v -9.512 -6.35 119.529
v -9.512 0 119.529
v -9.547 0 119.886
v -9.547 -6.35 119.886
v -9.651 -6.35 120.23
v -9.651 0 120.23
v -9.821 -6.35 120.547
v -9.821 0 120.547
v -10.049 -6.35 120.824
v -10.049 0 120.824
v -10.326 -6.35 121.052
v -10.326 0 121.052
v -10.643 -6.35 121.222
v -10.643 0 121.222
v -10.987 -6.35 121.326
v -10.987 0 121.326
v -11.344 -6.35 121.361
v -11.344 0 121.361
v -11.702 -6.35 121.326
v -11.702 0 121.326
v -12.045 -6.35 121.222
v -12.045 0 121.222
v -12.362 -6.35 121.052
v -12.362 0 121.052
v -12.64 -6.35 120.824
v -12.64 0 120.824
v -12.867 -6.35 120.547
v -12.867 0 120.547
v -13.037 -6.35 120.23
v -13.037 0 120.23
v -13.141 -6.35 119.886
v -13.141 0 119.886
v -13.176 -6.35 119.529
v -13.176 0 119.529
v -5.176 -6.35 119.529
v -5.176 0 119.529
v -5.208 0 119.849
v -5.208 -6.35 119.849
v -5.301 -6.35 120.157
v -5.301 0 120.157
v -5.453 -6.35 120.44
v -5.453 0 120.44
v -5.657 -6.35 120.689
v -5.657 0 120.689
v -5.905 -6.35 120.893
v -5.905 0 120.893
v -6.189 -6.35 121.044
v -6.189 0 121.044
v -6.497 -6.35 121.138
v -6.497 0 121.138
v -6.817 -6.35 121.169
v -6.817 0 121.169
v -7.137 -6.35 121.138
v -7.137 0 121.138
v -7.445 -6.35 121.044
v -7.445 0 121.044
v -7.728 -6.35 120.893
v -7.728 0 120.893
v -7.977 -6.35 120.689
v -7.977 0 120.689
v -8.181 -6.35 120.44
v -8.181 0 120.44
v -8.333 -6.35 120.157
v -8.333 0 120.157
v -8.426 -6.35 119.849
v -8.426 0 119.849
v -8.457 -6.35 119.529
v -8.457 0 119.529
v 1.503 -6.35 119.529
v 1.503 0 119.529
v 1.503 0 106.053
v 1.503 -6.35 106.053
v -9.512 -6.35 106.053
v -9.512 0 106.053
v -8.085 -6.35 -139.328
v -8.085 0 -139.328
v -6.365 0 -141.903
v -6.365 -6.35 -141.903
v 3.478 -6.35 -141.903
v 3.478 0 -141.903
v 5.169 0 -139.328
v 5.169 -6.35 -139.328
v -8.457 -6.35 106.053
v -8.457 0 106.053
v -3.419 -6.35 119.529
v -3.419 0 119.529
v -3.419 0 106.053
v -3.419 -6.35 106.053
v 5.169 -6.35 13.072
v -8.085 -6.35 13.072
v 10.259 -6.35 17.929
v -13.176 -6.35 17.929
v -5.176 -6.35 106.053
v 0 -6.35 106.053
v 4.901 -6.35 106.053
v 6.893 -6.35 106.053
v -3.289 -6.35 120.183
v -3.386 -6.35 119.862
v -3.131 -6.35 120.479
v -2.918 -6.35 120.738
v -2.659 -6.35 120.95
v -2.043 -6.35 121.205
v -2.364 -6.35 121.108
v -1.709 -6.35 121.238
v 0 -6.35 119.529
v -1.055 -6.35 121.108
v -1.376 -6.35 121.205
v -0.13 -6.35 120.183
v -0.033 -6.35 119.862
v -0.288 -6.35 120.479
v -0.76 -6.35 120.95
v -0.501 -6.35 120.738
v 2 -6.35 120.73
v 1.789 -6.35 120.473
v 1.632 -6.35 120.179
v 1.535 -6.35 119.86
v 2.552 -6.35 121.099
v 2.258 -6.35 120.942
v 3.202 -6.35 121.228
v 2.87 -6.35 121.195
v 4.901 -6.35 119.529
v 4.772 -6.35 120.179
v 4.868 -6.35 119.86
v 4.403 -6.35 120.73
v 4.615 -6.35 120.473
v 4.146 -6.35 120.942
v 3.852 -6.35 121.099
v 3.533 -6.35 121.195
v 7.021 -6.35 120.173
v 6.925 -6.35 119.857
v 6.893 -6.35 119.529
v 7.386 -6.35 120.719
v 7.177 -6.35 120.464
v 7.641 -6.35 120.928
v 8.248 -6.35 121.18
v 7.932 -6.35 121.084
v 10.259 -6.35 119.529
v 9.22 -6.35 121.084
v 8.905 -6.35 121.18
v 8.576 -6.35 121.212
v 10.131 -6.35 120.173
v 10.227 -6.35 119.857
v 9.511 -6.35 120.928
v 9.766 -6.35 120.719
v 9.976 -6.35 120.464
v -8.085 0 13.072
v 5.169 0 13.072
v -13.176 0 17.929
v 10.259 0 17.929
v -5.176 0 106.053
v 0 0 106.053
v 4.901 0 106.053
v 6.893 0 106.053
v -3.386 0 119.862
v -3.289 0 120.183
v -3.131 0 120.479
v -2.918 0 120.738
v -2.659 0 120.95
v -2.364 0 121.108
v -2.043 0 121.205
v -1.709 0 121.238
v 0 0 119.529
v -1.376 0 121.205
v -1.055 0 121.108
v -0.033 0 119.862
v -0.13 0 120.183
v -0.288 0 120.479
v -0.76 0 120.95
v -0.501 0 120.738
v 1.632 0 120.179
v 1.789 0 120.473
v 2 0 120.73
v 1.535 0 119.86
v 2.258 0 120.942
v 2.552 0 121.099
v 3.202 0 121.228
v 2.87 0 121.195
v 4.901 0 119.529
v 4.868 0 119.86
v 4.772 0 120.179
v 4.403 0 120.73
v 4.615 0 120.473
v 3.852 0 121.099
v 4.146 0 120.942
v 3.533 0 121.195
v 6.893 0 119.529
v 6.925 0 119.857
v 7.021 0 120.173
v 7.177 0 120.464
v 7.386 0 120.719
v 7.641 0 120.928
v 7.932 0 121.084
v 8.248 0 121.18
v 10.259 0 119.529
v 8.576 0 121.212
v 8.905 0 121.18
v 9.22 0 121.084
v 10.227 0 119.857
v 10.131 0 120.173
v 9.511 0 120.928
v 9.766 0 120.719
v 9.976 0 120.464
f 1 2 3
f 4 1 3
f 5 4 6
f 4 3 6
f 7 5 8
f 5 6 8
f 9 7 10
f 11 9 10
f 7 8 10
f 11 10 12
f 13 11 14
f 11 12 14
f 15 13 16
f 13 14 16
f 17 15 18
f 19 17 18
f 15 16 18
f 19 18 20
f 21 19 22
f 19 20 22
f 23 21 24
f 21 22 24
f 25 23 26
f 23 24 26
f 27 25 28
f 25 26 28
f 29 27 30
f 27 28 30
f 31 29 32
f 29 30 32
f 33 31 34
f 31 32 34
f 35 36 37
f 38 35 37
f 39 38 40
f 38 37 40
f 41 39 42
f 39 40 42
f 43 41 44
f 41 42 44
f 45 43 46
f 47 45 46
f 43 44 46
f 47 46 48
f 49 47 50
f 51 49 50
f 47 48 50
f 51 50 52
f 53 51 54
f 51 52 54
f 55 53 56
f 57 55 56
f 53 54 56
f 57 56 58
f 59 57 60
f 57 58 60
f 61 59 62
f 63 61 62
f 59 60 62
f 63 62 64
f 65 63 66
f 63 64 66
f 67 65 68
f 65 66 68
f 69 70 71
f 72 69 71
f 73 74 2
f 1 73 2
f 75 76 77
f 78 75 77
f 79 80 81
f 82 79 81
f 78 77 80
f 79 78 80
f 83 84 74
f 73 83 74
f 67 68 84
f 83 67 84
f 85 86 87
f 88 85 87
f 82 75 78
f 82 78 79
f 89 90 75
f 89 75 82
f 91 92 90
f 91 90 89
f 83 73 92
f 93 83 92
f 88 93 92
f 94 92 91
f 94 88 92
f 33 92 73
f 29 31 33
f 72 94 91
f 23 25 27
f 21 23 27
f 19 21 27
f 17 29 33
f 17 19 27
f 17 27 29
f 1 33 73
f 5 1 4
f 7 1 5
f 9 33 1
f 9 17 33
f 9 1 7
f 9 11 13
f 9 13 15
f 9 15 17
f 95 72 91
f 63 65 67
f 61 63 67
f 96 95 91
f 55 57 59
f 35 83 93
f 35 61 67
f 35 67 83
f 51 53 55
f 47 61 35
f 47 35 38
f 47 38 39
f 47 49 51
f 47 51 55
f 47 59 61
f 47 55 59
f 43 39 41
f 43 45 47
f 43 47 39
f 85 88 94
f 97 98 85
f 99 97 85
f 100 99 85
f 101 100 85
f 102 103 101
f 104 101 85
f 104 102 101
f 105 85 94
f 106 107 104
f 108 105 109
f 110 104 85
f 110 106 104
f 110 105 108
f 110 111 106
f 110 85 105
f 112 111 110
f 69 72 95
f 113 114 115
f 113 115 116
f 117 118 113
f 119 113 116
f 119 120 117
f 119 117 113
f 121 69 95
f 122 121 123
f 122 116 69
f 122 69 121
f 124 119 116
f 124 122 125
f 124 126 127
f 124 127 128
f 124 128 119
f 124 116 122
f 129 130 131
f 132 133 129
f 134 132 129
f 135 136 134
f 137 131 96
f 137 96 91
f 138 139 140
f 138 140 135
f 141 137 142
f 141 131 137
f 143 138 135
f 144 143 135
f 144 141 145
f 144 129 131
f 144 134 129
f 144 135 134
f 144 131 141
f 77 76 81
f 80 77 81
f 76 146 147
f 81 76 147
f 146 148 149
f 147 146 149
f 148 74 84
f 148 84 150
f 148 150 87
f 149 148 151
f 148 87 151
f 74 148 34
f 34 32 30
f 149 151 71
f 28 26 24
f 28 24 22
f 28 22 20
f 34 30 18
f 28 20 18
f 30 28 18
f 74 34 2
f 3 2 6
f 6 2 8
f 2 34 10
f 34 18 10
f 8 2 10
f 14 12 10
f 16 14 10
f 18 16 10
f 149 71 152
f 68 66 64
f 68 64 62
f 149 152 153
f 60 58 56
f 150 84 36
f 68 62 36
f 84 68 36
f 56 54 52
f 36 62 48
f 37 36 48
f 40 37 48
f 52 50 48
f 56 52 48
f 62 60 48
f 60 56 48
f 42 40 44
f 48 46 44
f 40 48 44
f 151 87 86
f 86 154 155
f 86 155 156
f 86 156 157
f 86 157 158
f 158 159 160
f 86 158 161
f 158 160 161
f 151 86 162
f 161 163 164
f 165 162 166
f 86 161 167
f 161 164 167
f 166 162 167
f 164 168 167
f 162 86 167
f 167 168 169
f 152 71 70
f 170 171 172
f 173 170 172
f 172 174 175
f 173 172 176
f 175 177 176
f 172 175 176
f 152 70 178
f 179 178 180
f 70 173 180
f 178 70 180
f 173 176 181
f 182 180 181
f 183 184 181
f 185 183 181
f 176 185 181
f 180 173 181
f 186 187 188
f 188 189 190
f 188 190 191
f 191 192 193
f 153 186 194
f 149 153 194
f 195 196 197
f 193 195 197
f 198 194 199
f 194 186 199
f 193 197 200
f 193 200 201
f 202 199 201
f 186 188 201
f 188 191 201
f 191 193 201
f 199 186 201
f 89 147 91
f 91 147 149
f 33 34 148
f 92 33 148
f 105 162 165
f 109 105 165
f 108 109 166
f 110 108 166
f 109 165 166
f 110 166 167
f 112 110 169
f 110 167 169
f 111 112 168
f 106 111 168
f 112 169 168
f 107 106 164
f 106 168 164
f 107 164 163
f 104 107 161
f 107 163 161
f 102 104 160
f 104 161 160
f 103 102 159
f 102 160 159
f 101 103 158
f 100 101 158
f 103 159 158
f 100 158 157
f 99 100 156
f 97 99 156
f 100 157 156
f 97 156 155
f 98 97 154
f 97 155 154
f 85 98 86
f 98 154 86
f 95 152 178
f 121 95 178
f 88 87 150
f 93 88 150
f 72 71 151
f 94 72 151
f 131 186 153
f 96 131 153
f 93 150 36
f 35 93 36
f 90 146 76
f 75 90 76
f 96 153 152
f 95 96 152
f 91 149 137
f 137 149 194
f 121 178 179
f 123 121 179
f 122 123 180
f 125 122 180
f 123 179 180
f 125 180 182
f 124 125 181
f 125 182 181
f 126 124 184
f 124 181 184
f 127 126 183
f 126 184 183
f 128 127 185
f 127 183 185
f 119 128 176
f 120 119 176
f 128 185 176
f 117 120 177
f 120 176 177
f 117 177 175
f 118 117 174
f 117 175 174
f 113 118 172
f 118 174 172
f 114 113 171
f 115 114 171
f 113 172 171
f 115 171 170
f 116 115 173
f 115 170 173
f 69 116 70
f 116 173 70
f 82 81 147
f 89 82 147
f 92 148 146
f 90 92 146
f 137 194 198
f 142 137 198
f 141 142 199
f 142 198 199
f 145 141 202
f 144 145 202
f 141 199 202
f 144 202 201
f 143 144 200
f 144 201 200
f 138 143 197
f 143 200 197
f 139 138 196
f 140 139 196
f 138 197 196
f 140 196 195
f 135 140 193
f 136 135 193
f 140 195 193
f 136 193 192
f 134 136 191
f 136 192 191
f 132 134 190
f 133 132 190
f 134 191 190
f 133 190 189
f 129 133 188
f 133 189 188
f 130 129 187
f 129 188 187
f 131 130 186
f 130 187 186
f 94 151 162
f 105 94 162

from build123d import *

# Parameters (mm, degrees)
F1_DEPTH = 6.35


with BuildPart() as f1:
    # F0 (on Front) → F1 (new body)
    with BuildSketch(Plane.XZ):
        with BuildLine():
            Line((-8.085411, 13.072304), (-8.085411, -139.327696))
            Line((-8.085411, -139.327696), (-6.365239, -141.902923))
            Line((-6.365239, -141.902923), (3.477706, -141.902923))
            Line((3.477706, -141.902923), (5.168511, -139.327696))
            Line((5.168511, -139.327696), (5.168511, 13.072304))
            Line((5.168511, 13.072304), (10.259341, 17.928839))
            Line((10.259341, 17.928839), (10.259341, 119.528839))
            ThreePointArc((10.259341, 119.528839), (8.576134, 121.212046), (6.892927, 119.528839))
            Line((6.892927, 119.528839), (6.892927, 106.053379))
            Line((6.892927, 106.053379), (4.900902, 106.053379))
            Line((4.900902, 106.053379), (4.900902, 119.528839))
            ThreePointArc((4.900902, 119.528839), (3.201823, 121.227918), (1.502743, 119.528839))
            Line((1.502743, 119.528839), (1.502743, 106.053379))
            Line((1.502743, 106.053379), (0, 106.053379))
            Line((0, 106.053379), (0, 119.528839))
            ThreePointArc((0, 119.528839), (-1.709364, 121.238202), (-3.418728, 119.528839))
            Line((-3.418728, 119.528839), (-3.418728, 106.053379))
            Line((-3.418728, 106.053379), (-5.176397, 106.053379))
            Line((-5.176397, 106.053379), (-5.176397, 119.528839))
            ThreePointArc((-5.176397, 119.528839), (-6.816888, 121.16933), (-8.457379, 119.528839))
            Line((-8.457379, 119.528839), (-8.457379, 106.053379))
            Line((-8.457379, 106.053379), (-9.51198, 106.053379))
            Line((-9.51198, 106.053379), (-9.51198, 119.528839))
            ThreePointArc((-9.51198, 119.528839), (-11.344111, 121.360969), (-13.176241, 119.528839))
            Line((-13.176241, 119.528839), (-13.176241, 17.928839))
            Line((-13.176241, 17.928839), (-8.085411, 13.072304))
        make_face()
    extrude(amount=F1_DEPTH)


solid = f1.part
